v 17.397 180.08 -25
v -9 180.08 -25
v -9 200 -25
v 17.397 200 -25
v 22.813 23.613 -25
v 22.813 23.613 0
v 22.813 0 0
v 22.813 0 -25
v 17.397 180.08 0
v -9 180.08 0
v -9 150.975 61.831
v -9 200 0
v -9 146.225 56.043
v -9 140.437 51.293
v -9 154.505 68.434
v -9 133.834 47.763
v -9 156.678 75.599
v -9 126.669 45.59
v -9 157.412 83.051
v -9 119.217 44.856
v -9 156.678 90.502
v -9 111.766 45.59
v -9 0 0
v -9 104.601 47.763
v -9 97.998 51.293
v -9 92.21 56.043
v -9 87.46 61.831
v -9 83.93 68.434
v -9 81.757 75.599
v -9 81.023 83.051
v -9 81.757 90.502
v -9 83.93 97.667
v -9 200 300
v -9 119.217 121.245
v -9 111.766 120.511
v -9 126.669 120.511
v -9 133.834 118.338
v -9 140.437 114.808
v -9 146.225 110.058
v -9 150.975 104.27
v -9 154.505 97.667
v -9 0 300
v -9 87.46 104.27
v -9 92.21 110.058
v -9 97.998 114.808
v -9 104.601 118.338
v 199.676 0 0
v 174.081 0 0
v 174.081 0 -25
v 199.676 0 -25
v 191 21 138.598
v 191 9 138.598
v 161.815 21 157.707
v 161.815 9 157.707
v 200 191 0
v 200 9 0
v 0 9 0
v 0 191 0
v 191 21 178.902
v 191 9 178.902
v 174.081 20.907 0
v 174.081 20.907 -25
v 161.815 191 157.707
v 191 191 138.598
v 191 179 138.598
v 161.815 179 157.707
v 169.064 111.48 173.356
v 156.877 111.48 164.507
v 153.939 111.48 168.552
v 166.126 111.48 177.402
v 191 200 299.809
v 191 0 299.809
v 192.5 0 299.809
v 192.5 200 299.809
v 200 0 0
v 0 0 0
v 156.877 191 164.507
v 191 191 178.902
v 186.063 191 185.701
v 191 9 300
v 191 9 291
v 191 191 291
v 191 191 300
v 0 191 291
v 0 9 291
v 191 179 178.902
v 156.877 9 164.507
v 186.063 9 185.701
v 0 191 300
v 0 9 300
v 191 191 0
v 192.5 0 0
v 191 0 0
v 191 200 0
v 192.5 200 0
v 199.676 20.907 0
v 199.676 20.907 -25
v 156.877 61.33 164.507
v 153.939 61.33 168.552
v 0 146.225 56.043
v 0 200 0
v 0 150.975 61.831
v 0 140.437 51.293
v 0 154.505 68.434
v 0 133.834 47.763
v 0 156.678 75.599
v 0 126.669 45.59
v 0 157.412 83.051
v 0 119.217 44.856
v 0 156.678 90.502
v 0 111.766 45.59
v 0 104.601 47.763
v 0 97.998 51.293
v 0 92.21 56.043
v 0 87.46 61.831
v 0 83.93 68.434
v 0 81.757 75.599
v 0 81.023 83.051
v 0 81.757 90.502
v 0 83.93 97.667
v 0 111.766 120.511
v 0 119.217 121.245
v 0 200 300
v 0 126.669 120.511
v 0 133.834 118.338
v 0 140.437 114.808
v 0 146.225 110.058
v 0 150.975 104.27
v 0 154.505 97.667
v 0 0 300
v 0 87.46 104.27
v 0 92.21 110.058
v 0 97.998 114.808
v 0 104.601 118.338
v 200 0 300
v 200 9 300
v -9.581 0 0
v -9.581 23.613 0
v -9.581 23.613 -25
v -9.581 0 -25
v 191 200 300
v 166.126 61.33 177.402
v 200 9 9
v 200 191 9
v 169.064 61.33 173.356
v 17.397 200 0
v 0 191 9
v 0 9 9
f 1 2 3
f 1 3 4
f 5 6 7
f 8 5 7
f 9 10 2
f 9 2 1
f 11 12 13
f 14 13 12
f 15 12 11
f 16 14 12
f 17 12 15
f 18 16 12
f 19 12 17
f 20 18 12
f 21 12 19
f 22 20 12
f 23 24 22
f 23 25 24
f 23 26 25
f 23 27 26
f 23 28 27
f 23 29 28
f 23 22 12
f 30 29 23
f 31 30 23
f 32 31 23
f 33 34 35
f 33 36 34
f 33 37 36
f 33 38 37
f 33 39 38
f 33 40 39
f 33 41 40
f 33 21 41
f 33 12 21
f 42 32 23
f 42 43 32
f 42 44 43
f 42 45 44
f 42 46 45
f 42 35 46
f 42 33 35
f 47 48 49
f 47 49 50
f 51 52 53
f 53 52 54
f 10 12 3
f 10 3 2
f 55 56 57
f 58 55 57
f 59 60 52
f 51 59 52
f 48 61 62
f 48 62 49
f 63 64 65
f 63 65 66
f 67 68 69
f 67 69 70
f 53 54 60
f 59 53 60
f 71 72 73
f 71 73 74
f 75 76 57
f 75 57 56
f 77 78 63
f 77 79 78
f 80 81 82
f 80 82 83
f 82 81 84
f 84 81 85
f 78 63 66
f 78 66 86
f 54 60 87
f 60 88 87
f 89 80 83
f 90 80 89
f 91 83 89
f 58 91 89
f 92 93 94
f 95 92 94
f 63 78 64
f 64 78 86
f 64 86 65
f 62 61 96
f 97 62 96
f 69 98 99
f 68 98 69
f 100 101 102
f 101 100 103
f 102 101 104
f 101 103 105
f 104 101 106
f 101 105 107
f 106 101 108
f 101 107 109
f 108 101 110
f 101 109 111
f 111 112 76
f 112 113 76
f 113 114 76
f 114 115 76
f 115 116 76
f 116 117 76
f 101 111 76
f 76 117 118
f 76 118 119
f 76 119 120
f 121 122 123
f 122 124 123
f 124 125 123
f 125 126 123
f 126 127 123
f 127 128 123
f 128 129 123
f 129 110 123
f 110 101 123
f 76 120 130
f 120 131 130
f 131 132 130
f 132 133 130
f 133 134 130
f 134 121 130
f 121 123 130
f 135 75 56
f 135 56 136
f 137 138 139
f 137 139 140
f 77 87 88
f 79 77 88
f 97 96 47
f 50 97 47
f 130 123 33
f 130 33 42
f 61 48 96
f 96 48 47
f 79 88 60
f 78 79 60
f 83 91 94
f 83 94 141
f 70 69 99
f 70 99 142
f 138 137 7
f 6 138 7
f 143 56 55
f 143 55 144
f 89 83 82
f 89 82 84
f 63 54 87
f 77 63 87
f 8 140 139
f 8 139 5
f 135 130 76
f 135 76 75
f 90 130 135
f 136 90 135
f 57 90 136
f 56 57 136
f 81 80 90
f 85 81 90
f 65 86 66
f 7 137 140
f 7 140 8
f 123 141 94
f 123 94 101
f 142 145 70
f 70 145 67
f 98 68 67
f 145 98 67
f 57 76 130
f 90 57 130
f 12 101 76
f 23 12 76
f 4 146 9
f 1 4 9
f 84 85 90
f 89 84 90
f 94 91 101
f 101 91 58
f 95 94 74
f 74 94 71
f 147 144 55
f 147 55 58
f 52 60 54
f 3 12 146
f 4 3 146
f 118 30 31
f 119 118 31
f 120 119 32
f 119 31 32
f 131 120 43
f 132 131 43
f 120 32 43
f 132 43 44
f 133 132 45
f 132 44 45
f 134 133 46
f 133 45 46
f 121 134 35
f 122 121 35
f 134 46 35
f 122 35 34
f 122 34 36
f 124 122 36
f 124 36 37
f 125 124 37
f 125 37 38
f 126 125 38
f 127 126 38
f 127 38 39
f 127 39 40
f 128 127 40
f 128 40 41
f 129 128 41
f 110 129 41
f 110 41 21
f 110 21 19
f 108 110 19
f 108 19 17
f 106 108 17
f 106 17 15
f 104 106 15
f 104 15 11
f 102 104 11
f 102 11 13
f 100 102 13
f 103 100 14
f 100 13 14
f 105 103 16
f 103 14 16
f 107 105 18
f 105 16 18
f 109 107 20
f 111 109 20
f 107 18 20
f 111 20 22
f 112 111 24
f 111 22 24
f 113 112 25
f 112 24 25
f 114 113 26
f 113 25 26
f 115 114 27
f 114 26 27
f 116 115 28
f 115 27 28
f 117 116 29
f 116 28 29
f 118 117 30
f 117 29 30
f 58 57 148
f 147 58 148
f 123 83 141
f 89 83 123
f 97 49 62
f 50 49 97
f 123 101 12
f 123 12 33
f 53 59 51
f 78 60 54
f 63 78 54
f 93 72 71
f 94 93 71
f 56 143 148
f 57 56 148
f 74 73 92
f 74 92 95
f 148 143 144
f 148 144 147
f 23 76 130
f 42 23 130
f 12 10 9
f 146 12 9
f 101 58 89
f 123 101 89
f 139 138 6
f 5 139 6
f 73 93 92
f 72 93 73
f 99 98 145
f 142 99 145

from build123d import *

# Parameters (mm, degrees)
F0_W      = 200
F0_H      = 300
F1_DEPTH  = 9
F3_DEPTH  = 12
F5_DEPTH  = 182
F7_DEPTH  = 12
F8_W      = 15.0606025722
F8_H      = 50.1502417028
F9_DEPTH  = 5
F10_W     = 191
F10_H     = 9
F11_DEPTH = 182
F12_W     = 200
F12_H     = 9
F13_DEPTH = 182
F14_W     = 191
F14_H     = 300
F16_DEPTH = 9
F17_W     = 200
F17_H     = 299.8089425825
F18_DEPTH = 1.5
F19_W     = 200
F19_H     = 300
F20_DEPTH = 9
F21_R     = 38.194679826
F22_DEPTH = 30
F23_W     = 32.3943905532
F23_H     = 23.6132256687
F24_DEPTH = 25
F25_W     = 25.5955606699
F25_H     = 20.9072008729
F26_DEPTH = 25
F27_W     = 26.3972375542
F27_H     = 19.920361042
F28_DEPTH = 25


# Not quite as in the source:
# - a feature names something its author has since deleted; it is built from what else it names


with BuildPart() as f1:
    # F0 (on Front) → F1 (new body)
    with BuildSketch(Plane.XZ):
        with Locations((100, 150)):
            Rectangle(F0_W, F0_H)
    extrude(amount=-F1_DEPTH)


with BuildPart() as f3:
    # F2 (on face) → F3 (new body)
    with BuildSketch(Plane(origin=(0, 9, 0), x_dir=(-1, 0, 0), z_dir=(0, 1, 0))):
        Polygon((-161.8147794008, 157.7074974775), (-191, 178.9015382528), (-191, 138.5981291533), align=None)
    extrude(amount=F3_DEPTH)


with BuildPart() as f5:
    # F4 (on face) → F5 (new body)
    with BuildSketch(Plane(origin=(0, 9, 0), x_dir=(-1, 0, 0), z_dir=(0, 1, 0))):
        Polygon((-191, 178.9015382528), (-161.8147794008, 157.7074974775), (-156.8773534762, 164.5065721009), (-186.0625740754, 185.7006128762), align=None)
    extrude(amount=F5_DEPTH)


with BuildPart() as f7:
    # F6 (on face) → F7 (new body)
    with BuildSketch(Plane(origin=(0, 191, 0), x_dir=(-1, 0, 0), z_dir=(0, 1, 0))):
        Polygon((-161.8147794008, 157.7074974775), (-191, 178.9015382528), (-191, 138.597920537), align=None)
    extrude(amount=-F7_DEPTH)


with BuildPart() as f9:
    # F8 (on face) → F9 (new body)
    with BuildSketch(Plane(origin=(-24.0503636645, 0, 33.1185155525), x_dir=(0.8091522816, 0, 0.5875990004), z_dir=(-0.5875990004, 0, 0.8091522816))):
        with Locations((231.1318670975, 86.4051077515)):
            Rectangle(F8_W, F8_H)
    extrude(amount=F9_DEPTH)


with BuildPart() as f11:
    # F10 (on face) → F11 (new body)
    with BuildSketch(Plane(origin=(0, 9, 0), x_dir=(-1, 0, 0), z_dir=(0, 1, 0))):
        with Locations((-95.5, 295.5)):
            Rectangle(F10_W, F10_H)
    extrude(amount=F11_DEPTH)


with BuildPart() as f13:
    # F12 (on face) → F13 (new body)
    with BuildSketch(Plane(origin=(0, 9, 0), x_dir=(-1, 0, 0), z_dir=(0, 1, 0))):
        with Locations((-100, 4.5)):
            Rectangle(F12_W, F12_H)
    extrude(amount=F13_DEPTH)


with BuildPart() as f16:
    # F14 (on face) → F16 (new body)
    with BuildSketch(Plane(origin=(0, 191, 0), x_dir=(-1, 0, 0), z_dir=(0, 1, 0))):
        with Locations((-95.5, 150)):
            Rectangle(F14_W, F14_H)
    extrude(amount=F16_DEPTH)


with BuildPart() as f18:
    # F17 (on face) → F18 (new body)
    with BuildSketch(Plane.YZ.offset(191)):
        with Locations((100, 149.9044712912)):
            Rectangle(F17_W, F17_H)
    extrude(amount=F18_DEPTH)


with BuildPart() as f20:
    # F19 (on face) → F20 (new body)
    with BuildSketch(Plane(origin=(0, 0, 0), x_dir=(0, -1, 0), z_dir=(-1, 0, 0))):
        with Locations((-100, 150)):
            Rectangle(F19_W, F19_H)
    extrude(amount=F20_DEPTH)

    # F21 (on face) → F22 (cut)
    with BuildSketch(Plane(origin=(-9, 0, 0), x_dir=(0, -1, 0), z_dir=(-1, 0, 0))):
        with Locations((-119.2174553871, 83.0505564809)):
            Circle(F21_R)
    extrude(amount=-F22_DEPTH, mode=Mode.SUBTRACT)


with BuildPart() as f24:
    # F23 (on face) → F24 (new body)
    with BuildSketch(Plane(origin=(0, 0, 0), x_dir=(1, 0, 0), z_dir=(0, 0, -1))):
        with Locations((6.6161714494, -11.8066128343)):
            Rectangle(F23_W, F23_H)
    extrude(amount=F24_DEPTH)


with BuildPart() as f26:
    # F25 (on face) → F26 (new body)
    with BuildSketch(Plane(origin=(0, 0, 0), x_dir=(1, 0, 0), z_dir=(0, 0, -1))):
        with Locations((186.878465116, -10.4536004364)):
            Rectangle(F25_W, F25_H)
    extrude(amount=F26_DEPTH)


with BuildPart() as f28:
    # F27 (on face) → F28 (new body)
    with BuildSketch(Plane(origin=(0, 0, 0), x_dir=(1, 0, 0), z_dir=(0, 0, -1))):
        with Locations((4.1986187771, -190.039819479)):
            Rectangle(F27_W, F27_H)
    extrude(amount=F28_DEPTH)


solid = Compound([f1.part, f3.part, f5.part, f7.part, f9.part, f11.part, f13.part, f16.part, f18.part, f20.part, f24.part, f26.part, f28.part])
